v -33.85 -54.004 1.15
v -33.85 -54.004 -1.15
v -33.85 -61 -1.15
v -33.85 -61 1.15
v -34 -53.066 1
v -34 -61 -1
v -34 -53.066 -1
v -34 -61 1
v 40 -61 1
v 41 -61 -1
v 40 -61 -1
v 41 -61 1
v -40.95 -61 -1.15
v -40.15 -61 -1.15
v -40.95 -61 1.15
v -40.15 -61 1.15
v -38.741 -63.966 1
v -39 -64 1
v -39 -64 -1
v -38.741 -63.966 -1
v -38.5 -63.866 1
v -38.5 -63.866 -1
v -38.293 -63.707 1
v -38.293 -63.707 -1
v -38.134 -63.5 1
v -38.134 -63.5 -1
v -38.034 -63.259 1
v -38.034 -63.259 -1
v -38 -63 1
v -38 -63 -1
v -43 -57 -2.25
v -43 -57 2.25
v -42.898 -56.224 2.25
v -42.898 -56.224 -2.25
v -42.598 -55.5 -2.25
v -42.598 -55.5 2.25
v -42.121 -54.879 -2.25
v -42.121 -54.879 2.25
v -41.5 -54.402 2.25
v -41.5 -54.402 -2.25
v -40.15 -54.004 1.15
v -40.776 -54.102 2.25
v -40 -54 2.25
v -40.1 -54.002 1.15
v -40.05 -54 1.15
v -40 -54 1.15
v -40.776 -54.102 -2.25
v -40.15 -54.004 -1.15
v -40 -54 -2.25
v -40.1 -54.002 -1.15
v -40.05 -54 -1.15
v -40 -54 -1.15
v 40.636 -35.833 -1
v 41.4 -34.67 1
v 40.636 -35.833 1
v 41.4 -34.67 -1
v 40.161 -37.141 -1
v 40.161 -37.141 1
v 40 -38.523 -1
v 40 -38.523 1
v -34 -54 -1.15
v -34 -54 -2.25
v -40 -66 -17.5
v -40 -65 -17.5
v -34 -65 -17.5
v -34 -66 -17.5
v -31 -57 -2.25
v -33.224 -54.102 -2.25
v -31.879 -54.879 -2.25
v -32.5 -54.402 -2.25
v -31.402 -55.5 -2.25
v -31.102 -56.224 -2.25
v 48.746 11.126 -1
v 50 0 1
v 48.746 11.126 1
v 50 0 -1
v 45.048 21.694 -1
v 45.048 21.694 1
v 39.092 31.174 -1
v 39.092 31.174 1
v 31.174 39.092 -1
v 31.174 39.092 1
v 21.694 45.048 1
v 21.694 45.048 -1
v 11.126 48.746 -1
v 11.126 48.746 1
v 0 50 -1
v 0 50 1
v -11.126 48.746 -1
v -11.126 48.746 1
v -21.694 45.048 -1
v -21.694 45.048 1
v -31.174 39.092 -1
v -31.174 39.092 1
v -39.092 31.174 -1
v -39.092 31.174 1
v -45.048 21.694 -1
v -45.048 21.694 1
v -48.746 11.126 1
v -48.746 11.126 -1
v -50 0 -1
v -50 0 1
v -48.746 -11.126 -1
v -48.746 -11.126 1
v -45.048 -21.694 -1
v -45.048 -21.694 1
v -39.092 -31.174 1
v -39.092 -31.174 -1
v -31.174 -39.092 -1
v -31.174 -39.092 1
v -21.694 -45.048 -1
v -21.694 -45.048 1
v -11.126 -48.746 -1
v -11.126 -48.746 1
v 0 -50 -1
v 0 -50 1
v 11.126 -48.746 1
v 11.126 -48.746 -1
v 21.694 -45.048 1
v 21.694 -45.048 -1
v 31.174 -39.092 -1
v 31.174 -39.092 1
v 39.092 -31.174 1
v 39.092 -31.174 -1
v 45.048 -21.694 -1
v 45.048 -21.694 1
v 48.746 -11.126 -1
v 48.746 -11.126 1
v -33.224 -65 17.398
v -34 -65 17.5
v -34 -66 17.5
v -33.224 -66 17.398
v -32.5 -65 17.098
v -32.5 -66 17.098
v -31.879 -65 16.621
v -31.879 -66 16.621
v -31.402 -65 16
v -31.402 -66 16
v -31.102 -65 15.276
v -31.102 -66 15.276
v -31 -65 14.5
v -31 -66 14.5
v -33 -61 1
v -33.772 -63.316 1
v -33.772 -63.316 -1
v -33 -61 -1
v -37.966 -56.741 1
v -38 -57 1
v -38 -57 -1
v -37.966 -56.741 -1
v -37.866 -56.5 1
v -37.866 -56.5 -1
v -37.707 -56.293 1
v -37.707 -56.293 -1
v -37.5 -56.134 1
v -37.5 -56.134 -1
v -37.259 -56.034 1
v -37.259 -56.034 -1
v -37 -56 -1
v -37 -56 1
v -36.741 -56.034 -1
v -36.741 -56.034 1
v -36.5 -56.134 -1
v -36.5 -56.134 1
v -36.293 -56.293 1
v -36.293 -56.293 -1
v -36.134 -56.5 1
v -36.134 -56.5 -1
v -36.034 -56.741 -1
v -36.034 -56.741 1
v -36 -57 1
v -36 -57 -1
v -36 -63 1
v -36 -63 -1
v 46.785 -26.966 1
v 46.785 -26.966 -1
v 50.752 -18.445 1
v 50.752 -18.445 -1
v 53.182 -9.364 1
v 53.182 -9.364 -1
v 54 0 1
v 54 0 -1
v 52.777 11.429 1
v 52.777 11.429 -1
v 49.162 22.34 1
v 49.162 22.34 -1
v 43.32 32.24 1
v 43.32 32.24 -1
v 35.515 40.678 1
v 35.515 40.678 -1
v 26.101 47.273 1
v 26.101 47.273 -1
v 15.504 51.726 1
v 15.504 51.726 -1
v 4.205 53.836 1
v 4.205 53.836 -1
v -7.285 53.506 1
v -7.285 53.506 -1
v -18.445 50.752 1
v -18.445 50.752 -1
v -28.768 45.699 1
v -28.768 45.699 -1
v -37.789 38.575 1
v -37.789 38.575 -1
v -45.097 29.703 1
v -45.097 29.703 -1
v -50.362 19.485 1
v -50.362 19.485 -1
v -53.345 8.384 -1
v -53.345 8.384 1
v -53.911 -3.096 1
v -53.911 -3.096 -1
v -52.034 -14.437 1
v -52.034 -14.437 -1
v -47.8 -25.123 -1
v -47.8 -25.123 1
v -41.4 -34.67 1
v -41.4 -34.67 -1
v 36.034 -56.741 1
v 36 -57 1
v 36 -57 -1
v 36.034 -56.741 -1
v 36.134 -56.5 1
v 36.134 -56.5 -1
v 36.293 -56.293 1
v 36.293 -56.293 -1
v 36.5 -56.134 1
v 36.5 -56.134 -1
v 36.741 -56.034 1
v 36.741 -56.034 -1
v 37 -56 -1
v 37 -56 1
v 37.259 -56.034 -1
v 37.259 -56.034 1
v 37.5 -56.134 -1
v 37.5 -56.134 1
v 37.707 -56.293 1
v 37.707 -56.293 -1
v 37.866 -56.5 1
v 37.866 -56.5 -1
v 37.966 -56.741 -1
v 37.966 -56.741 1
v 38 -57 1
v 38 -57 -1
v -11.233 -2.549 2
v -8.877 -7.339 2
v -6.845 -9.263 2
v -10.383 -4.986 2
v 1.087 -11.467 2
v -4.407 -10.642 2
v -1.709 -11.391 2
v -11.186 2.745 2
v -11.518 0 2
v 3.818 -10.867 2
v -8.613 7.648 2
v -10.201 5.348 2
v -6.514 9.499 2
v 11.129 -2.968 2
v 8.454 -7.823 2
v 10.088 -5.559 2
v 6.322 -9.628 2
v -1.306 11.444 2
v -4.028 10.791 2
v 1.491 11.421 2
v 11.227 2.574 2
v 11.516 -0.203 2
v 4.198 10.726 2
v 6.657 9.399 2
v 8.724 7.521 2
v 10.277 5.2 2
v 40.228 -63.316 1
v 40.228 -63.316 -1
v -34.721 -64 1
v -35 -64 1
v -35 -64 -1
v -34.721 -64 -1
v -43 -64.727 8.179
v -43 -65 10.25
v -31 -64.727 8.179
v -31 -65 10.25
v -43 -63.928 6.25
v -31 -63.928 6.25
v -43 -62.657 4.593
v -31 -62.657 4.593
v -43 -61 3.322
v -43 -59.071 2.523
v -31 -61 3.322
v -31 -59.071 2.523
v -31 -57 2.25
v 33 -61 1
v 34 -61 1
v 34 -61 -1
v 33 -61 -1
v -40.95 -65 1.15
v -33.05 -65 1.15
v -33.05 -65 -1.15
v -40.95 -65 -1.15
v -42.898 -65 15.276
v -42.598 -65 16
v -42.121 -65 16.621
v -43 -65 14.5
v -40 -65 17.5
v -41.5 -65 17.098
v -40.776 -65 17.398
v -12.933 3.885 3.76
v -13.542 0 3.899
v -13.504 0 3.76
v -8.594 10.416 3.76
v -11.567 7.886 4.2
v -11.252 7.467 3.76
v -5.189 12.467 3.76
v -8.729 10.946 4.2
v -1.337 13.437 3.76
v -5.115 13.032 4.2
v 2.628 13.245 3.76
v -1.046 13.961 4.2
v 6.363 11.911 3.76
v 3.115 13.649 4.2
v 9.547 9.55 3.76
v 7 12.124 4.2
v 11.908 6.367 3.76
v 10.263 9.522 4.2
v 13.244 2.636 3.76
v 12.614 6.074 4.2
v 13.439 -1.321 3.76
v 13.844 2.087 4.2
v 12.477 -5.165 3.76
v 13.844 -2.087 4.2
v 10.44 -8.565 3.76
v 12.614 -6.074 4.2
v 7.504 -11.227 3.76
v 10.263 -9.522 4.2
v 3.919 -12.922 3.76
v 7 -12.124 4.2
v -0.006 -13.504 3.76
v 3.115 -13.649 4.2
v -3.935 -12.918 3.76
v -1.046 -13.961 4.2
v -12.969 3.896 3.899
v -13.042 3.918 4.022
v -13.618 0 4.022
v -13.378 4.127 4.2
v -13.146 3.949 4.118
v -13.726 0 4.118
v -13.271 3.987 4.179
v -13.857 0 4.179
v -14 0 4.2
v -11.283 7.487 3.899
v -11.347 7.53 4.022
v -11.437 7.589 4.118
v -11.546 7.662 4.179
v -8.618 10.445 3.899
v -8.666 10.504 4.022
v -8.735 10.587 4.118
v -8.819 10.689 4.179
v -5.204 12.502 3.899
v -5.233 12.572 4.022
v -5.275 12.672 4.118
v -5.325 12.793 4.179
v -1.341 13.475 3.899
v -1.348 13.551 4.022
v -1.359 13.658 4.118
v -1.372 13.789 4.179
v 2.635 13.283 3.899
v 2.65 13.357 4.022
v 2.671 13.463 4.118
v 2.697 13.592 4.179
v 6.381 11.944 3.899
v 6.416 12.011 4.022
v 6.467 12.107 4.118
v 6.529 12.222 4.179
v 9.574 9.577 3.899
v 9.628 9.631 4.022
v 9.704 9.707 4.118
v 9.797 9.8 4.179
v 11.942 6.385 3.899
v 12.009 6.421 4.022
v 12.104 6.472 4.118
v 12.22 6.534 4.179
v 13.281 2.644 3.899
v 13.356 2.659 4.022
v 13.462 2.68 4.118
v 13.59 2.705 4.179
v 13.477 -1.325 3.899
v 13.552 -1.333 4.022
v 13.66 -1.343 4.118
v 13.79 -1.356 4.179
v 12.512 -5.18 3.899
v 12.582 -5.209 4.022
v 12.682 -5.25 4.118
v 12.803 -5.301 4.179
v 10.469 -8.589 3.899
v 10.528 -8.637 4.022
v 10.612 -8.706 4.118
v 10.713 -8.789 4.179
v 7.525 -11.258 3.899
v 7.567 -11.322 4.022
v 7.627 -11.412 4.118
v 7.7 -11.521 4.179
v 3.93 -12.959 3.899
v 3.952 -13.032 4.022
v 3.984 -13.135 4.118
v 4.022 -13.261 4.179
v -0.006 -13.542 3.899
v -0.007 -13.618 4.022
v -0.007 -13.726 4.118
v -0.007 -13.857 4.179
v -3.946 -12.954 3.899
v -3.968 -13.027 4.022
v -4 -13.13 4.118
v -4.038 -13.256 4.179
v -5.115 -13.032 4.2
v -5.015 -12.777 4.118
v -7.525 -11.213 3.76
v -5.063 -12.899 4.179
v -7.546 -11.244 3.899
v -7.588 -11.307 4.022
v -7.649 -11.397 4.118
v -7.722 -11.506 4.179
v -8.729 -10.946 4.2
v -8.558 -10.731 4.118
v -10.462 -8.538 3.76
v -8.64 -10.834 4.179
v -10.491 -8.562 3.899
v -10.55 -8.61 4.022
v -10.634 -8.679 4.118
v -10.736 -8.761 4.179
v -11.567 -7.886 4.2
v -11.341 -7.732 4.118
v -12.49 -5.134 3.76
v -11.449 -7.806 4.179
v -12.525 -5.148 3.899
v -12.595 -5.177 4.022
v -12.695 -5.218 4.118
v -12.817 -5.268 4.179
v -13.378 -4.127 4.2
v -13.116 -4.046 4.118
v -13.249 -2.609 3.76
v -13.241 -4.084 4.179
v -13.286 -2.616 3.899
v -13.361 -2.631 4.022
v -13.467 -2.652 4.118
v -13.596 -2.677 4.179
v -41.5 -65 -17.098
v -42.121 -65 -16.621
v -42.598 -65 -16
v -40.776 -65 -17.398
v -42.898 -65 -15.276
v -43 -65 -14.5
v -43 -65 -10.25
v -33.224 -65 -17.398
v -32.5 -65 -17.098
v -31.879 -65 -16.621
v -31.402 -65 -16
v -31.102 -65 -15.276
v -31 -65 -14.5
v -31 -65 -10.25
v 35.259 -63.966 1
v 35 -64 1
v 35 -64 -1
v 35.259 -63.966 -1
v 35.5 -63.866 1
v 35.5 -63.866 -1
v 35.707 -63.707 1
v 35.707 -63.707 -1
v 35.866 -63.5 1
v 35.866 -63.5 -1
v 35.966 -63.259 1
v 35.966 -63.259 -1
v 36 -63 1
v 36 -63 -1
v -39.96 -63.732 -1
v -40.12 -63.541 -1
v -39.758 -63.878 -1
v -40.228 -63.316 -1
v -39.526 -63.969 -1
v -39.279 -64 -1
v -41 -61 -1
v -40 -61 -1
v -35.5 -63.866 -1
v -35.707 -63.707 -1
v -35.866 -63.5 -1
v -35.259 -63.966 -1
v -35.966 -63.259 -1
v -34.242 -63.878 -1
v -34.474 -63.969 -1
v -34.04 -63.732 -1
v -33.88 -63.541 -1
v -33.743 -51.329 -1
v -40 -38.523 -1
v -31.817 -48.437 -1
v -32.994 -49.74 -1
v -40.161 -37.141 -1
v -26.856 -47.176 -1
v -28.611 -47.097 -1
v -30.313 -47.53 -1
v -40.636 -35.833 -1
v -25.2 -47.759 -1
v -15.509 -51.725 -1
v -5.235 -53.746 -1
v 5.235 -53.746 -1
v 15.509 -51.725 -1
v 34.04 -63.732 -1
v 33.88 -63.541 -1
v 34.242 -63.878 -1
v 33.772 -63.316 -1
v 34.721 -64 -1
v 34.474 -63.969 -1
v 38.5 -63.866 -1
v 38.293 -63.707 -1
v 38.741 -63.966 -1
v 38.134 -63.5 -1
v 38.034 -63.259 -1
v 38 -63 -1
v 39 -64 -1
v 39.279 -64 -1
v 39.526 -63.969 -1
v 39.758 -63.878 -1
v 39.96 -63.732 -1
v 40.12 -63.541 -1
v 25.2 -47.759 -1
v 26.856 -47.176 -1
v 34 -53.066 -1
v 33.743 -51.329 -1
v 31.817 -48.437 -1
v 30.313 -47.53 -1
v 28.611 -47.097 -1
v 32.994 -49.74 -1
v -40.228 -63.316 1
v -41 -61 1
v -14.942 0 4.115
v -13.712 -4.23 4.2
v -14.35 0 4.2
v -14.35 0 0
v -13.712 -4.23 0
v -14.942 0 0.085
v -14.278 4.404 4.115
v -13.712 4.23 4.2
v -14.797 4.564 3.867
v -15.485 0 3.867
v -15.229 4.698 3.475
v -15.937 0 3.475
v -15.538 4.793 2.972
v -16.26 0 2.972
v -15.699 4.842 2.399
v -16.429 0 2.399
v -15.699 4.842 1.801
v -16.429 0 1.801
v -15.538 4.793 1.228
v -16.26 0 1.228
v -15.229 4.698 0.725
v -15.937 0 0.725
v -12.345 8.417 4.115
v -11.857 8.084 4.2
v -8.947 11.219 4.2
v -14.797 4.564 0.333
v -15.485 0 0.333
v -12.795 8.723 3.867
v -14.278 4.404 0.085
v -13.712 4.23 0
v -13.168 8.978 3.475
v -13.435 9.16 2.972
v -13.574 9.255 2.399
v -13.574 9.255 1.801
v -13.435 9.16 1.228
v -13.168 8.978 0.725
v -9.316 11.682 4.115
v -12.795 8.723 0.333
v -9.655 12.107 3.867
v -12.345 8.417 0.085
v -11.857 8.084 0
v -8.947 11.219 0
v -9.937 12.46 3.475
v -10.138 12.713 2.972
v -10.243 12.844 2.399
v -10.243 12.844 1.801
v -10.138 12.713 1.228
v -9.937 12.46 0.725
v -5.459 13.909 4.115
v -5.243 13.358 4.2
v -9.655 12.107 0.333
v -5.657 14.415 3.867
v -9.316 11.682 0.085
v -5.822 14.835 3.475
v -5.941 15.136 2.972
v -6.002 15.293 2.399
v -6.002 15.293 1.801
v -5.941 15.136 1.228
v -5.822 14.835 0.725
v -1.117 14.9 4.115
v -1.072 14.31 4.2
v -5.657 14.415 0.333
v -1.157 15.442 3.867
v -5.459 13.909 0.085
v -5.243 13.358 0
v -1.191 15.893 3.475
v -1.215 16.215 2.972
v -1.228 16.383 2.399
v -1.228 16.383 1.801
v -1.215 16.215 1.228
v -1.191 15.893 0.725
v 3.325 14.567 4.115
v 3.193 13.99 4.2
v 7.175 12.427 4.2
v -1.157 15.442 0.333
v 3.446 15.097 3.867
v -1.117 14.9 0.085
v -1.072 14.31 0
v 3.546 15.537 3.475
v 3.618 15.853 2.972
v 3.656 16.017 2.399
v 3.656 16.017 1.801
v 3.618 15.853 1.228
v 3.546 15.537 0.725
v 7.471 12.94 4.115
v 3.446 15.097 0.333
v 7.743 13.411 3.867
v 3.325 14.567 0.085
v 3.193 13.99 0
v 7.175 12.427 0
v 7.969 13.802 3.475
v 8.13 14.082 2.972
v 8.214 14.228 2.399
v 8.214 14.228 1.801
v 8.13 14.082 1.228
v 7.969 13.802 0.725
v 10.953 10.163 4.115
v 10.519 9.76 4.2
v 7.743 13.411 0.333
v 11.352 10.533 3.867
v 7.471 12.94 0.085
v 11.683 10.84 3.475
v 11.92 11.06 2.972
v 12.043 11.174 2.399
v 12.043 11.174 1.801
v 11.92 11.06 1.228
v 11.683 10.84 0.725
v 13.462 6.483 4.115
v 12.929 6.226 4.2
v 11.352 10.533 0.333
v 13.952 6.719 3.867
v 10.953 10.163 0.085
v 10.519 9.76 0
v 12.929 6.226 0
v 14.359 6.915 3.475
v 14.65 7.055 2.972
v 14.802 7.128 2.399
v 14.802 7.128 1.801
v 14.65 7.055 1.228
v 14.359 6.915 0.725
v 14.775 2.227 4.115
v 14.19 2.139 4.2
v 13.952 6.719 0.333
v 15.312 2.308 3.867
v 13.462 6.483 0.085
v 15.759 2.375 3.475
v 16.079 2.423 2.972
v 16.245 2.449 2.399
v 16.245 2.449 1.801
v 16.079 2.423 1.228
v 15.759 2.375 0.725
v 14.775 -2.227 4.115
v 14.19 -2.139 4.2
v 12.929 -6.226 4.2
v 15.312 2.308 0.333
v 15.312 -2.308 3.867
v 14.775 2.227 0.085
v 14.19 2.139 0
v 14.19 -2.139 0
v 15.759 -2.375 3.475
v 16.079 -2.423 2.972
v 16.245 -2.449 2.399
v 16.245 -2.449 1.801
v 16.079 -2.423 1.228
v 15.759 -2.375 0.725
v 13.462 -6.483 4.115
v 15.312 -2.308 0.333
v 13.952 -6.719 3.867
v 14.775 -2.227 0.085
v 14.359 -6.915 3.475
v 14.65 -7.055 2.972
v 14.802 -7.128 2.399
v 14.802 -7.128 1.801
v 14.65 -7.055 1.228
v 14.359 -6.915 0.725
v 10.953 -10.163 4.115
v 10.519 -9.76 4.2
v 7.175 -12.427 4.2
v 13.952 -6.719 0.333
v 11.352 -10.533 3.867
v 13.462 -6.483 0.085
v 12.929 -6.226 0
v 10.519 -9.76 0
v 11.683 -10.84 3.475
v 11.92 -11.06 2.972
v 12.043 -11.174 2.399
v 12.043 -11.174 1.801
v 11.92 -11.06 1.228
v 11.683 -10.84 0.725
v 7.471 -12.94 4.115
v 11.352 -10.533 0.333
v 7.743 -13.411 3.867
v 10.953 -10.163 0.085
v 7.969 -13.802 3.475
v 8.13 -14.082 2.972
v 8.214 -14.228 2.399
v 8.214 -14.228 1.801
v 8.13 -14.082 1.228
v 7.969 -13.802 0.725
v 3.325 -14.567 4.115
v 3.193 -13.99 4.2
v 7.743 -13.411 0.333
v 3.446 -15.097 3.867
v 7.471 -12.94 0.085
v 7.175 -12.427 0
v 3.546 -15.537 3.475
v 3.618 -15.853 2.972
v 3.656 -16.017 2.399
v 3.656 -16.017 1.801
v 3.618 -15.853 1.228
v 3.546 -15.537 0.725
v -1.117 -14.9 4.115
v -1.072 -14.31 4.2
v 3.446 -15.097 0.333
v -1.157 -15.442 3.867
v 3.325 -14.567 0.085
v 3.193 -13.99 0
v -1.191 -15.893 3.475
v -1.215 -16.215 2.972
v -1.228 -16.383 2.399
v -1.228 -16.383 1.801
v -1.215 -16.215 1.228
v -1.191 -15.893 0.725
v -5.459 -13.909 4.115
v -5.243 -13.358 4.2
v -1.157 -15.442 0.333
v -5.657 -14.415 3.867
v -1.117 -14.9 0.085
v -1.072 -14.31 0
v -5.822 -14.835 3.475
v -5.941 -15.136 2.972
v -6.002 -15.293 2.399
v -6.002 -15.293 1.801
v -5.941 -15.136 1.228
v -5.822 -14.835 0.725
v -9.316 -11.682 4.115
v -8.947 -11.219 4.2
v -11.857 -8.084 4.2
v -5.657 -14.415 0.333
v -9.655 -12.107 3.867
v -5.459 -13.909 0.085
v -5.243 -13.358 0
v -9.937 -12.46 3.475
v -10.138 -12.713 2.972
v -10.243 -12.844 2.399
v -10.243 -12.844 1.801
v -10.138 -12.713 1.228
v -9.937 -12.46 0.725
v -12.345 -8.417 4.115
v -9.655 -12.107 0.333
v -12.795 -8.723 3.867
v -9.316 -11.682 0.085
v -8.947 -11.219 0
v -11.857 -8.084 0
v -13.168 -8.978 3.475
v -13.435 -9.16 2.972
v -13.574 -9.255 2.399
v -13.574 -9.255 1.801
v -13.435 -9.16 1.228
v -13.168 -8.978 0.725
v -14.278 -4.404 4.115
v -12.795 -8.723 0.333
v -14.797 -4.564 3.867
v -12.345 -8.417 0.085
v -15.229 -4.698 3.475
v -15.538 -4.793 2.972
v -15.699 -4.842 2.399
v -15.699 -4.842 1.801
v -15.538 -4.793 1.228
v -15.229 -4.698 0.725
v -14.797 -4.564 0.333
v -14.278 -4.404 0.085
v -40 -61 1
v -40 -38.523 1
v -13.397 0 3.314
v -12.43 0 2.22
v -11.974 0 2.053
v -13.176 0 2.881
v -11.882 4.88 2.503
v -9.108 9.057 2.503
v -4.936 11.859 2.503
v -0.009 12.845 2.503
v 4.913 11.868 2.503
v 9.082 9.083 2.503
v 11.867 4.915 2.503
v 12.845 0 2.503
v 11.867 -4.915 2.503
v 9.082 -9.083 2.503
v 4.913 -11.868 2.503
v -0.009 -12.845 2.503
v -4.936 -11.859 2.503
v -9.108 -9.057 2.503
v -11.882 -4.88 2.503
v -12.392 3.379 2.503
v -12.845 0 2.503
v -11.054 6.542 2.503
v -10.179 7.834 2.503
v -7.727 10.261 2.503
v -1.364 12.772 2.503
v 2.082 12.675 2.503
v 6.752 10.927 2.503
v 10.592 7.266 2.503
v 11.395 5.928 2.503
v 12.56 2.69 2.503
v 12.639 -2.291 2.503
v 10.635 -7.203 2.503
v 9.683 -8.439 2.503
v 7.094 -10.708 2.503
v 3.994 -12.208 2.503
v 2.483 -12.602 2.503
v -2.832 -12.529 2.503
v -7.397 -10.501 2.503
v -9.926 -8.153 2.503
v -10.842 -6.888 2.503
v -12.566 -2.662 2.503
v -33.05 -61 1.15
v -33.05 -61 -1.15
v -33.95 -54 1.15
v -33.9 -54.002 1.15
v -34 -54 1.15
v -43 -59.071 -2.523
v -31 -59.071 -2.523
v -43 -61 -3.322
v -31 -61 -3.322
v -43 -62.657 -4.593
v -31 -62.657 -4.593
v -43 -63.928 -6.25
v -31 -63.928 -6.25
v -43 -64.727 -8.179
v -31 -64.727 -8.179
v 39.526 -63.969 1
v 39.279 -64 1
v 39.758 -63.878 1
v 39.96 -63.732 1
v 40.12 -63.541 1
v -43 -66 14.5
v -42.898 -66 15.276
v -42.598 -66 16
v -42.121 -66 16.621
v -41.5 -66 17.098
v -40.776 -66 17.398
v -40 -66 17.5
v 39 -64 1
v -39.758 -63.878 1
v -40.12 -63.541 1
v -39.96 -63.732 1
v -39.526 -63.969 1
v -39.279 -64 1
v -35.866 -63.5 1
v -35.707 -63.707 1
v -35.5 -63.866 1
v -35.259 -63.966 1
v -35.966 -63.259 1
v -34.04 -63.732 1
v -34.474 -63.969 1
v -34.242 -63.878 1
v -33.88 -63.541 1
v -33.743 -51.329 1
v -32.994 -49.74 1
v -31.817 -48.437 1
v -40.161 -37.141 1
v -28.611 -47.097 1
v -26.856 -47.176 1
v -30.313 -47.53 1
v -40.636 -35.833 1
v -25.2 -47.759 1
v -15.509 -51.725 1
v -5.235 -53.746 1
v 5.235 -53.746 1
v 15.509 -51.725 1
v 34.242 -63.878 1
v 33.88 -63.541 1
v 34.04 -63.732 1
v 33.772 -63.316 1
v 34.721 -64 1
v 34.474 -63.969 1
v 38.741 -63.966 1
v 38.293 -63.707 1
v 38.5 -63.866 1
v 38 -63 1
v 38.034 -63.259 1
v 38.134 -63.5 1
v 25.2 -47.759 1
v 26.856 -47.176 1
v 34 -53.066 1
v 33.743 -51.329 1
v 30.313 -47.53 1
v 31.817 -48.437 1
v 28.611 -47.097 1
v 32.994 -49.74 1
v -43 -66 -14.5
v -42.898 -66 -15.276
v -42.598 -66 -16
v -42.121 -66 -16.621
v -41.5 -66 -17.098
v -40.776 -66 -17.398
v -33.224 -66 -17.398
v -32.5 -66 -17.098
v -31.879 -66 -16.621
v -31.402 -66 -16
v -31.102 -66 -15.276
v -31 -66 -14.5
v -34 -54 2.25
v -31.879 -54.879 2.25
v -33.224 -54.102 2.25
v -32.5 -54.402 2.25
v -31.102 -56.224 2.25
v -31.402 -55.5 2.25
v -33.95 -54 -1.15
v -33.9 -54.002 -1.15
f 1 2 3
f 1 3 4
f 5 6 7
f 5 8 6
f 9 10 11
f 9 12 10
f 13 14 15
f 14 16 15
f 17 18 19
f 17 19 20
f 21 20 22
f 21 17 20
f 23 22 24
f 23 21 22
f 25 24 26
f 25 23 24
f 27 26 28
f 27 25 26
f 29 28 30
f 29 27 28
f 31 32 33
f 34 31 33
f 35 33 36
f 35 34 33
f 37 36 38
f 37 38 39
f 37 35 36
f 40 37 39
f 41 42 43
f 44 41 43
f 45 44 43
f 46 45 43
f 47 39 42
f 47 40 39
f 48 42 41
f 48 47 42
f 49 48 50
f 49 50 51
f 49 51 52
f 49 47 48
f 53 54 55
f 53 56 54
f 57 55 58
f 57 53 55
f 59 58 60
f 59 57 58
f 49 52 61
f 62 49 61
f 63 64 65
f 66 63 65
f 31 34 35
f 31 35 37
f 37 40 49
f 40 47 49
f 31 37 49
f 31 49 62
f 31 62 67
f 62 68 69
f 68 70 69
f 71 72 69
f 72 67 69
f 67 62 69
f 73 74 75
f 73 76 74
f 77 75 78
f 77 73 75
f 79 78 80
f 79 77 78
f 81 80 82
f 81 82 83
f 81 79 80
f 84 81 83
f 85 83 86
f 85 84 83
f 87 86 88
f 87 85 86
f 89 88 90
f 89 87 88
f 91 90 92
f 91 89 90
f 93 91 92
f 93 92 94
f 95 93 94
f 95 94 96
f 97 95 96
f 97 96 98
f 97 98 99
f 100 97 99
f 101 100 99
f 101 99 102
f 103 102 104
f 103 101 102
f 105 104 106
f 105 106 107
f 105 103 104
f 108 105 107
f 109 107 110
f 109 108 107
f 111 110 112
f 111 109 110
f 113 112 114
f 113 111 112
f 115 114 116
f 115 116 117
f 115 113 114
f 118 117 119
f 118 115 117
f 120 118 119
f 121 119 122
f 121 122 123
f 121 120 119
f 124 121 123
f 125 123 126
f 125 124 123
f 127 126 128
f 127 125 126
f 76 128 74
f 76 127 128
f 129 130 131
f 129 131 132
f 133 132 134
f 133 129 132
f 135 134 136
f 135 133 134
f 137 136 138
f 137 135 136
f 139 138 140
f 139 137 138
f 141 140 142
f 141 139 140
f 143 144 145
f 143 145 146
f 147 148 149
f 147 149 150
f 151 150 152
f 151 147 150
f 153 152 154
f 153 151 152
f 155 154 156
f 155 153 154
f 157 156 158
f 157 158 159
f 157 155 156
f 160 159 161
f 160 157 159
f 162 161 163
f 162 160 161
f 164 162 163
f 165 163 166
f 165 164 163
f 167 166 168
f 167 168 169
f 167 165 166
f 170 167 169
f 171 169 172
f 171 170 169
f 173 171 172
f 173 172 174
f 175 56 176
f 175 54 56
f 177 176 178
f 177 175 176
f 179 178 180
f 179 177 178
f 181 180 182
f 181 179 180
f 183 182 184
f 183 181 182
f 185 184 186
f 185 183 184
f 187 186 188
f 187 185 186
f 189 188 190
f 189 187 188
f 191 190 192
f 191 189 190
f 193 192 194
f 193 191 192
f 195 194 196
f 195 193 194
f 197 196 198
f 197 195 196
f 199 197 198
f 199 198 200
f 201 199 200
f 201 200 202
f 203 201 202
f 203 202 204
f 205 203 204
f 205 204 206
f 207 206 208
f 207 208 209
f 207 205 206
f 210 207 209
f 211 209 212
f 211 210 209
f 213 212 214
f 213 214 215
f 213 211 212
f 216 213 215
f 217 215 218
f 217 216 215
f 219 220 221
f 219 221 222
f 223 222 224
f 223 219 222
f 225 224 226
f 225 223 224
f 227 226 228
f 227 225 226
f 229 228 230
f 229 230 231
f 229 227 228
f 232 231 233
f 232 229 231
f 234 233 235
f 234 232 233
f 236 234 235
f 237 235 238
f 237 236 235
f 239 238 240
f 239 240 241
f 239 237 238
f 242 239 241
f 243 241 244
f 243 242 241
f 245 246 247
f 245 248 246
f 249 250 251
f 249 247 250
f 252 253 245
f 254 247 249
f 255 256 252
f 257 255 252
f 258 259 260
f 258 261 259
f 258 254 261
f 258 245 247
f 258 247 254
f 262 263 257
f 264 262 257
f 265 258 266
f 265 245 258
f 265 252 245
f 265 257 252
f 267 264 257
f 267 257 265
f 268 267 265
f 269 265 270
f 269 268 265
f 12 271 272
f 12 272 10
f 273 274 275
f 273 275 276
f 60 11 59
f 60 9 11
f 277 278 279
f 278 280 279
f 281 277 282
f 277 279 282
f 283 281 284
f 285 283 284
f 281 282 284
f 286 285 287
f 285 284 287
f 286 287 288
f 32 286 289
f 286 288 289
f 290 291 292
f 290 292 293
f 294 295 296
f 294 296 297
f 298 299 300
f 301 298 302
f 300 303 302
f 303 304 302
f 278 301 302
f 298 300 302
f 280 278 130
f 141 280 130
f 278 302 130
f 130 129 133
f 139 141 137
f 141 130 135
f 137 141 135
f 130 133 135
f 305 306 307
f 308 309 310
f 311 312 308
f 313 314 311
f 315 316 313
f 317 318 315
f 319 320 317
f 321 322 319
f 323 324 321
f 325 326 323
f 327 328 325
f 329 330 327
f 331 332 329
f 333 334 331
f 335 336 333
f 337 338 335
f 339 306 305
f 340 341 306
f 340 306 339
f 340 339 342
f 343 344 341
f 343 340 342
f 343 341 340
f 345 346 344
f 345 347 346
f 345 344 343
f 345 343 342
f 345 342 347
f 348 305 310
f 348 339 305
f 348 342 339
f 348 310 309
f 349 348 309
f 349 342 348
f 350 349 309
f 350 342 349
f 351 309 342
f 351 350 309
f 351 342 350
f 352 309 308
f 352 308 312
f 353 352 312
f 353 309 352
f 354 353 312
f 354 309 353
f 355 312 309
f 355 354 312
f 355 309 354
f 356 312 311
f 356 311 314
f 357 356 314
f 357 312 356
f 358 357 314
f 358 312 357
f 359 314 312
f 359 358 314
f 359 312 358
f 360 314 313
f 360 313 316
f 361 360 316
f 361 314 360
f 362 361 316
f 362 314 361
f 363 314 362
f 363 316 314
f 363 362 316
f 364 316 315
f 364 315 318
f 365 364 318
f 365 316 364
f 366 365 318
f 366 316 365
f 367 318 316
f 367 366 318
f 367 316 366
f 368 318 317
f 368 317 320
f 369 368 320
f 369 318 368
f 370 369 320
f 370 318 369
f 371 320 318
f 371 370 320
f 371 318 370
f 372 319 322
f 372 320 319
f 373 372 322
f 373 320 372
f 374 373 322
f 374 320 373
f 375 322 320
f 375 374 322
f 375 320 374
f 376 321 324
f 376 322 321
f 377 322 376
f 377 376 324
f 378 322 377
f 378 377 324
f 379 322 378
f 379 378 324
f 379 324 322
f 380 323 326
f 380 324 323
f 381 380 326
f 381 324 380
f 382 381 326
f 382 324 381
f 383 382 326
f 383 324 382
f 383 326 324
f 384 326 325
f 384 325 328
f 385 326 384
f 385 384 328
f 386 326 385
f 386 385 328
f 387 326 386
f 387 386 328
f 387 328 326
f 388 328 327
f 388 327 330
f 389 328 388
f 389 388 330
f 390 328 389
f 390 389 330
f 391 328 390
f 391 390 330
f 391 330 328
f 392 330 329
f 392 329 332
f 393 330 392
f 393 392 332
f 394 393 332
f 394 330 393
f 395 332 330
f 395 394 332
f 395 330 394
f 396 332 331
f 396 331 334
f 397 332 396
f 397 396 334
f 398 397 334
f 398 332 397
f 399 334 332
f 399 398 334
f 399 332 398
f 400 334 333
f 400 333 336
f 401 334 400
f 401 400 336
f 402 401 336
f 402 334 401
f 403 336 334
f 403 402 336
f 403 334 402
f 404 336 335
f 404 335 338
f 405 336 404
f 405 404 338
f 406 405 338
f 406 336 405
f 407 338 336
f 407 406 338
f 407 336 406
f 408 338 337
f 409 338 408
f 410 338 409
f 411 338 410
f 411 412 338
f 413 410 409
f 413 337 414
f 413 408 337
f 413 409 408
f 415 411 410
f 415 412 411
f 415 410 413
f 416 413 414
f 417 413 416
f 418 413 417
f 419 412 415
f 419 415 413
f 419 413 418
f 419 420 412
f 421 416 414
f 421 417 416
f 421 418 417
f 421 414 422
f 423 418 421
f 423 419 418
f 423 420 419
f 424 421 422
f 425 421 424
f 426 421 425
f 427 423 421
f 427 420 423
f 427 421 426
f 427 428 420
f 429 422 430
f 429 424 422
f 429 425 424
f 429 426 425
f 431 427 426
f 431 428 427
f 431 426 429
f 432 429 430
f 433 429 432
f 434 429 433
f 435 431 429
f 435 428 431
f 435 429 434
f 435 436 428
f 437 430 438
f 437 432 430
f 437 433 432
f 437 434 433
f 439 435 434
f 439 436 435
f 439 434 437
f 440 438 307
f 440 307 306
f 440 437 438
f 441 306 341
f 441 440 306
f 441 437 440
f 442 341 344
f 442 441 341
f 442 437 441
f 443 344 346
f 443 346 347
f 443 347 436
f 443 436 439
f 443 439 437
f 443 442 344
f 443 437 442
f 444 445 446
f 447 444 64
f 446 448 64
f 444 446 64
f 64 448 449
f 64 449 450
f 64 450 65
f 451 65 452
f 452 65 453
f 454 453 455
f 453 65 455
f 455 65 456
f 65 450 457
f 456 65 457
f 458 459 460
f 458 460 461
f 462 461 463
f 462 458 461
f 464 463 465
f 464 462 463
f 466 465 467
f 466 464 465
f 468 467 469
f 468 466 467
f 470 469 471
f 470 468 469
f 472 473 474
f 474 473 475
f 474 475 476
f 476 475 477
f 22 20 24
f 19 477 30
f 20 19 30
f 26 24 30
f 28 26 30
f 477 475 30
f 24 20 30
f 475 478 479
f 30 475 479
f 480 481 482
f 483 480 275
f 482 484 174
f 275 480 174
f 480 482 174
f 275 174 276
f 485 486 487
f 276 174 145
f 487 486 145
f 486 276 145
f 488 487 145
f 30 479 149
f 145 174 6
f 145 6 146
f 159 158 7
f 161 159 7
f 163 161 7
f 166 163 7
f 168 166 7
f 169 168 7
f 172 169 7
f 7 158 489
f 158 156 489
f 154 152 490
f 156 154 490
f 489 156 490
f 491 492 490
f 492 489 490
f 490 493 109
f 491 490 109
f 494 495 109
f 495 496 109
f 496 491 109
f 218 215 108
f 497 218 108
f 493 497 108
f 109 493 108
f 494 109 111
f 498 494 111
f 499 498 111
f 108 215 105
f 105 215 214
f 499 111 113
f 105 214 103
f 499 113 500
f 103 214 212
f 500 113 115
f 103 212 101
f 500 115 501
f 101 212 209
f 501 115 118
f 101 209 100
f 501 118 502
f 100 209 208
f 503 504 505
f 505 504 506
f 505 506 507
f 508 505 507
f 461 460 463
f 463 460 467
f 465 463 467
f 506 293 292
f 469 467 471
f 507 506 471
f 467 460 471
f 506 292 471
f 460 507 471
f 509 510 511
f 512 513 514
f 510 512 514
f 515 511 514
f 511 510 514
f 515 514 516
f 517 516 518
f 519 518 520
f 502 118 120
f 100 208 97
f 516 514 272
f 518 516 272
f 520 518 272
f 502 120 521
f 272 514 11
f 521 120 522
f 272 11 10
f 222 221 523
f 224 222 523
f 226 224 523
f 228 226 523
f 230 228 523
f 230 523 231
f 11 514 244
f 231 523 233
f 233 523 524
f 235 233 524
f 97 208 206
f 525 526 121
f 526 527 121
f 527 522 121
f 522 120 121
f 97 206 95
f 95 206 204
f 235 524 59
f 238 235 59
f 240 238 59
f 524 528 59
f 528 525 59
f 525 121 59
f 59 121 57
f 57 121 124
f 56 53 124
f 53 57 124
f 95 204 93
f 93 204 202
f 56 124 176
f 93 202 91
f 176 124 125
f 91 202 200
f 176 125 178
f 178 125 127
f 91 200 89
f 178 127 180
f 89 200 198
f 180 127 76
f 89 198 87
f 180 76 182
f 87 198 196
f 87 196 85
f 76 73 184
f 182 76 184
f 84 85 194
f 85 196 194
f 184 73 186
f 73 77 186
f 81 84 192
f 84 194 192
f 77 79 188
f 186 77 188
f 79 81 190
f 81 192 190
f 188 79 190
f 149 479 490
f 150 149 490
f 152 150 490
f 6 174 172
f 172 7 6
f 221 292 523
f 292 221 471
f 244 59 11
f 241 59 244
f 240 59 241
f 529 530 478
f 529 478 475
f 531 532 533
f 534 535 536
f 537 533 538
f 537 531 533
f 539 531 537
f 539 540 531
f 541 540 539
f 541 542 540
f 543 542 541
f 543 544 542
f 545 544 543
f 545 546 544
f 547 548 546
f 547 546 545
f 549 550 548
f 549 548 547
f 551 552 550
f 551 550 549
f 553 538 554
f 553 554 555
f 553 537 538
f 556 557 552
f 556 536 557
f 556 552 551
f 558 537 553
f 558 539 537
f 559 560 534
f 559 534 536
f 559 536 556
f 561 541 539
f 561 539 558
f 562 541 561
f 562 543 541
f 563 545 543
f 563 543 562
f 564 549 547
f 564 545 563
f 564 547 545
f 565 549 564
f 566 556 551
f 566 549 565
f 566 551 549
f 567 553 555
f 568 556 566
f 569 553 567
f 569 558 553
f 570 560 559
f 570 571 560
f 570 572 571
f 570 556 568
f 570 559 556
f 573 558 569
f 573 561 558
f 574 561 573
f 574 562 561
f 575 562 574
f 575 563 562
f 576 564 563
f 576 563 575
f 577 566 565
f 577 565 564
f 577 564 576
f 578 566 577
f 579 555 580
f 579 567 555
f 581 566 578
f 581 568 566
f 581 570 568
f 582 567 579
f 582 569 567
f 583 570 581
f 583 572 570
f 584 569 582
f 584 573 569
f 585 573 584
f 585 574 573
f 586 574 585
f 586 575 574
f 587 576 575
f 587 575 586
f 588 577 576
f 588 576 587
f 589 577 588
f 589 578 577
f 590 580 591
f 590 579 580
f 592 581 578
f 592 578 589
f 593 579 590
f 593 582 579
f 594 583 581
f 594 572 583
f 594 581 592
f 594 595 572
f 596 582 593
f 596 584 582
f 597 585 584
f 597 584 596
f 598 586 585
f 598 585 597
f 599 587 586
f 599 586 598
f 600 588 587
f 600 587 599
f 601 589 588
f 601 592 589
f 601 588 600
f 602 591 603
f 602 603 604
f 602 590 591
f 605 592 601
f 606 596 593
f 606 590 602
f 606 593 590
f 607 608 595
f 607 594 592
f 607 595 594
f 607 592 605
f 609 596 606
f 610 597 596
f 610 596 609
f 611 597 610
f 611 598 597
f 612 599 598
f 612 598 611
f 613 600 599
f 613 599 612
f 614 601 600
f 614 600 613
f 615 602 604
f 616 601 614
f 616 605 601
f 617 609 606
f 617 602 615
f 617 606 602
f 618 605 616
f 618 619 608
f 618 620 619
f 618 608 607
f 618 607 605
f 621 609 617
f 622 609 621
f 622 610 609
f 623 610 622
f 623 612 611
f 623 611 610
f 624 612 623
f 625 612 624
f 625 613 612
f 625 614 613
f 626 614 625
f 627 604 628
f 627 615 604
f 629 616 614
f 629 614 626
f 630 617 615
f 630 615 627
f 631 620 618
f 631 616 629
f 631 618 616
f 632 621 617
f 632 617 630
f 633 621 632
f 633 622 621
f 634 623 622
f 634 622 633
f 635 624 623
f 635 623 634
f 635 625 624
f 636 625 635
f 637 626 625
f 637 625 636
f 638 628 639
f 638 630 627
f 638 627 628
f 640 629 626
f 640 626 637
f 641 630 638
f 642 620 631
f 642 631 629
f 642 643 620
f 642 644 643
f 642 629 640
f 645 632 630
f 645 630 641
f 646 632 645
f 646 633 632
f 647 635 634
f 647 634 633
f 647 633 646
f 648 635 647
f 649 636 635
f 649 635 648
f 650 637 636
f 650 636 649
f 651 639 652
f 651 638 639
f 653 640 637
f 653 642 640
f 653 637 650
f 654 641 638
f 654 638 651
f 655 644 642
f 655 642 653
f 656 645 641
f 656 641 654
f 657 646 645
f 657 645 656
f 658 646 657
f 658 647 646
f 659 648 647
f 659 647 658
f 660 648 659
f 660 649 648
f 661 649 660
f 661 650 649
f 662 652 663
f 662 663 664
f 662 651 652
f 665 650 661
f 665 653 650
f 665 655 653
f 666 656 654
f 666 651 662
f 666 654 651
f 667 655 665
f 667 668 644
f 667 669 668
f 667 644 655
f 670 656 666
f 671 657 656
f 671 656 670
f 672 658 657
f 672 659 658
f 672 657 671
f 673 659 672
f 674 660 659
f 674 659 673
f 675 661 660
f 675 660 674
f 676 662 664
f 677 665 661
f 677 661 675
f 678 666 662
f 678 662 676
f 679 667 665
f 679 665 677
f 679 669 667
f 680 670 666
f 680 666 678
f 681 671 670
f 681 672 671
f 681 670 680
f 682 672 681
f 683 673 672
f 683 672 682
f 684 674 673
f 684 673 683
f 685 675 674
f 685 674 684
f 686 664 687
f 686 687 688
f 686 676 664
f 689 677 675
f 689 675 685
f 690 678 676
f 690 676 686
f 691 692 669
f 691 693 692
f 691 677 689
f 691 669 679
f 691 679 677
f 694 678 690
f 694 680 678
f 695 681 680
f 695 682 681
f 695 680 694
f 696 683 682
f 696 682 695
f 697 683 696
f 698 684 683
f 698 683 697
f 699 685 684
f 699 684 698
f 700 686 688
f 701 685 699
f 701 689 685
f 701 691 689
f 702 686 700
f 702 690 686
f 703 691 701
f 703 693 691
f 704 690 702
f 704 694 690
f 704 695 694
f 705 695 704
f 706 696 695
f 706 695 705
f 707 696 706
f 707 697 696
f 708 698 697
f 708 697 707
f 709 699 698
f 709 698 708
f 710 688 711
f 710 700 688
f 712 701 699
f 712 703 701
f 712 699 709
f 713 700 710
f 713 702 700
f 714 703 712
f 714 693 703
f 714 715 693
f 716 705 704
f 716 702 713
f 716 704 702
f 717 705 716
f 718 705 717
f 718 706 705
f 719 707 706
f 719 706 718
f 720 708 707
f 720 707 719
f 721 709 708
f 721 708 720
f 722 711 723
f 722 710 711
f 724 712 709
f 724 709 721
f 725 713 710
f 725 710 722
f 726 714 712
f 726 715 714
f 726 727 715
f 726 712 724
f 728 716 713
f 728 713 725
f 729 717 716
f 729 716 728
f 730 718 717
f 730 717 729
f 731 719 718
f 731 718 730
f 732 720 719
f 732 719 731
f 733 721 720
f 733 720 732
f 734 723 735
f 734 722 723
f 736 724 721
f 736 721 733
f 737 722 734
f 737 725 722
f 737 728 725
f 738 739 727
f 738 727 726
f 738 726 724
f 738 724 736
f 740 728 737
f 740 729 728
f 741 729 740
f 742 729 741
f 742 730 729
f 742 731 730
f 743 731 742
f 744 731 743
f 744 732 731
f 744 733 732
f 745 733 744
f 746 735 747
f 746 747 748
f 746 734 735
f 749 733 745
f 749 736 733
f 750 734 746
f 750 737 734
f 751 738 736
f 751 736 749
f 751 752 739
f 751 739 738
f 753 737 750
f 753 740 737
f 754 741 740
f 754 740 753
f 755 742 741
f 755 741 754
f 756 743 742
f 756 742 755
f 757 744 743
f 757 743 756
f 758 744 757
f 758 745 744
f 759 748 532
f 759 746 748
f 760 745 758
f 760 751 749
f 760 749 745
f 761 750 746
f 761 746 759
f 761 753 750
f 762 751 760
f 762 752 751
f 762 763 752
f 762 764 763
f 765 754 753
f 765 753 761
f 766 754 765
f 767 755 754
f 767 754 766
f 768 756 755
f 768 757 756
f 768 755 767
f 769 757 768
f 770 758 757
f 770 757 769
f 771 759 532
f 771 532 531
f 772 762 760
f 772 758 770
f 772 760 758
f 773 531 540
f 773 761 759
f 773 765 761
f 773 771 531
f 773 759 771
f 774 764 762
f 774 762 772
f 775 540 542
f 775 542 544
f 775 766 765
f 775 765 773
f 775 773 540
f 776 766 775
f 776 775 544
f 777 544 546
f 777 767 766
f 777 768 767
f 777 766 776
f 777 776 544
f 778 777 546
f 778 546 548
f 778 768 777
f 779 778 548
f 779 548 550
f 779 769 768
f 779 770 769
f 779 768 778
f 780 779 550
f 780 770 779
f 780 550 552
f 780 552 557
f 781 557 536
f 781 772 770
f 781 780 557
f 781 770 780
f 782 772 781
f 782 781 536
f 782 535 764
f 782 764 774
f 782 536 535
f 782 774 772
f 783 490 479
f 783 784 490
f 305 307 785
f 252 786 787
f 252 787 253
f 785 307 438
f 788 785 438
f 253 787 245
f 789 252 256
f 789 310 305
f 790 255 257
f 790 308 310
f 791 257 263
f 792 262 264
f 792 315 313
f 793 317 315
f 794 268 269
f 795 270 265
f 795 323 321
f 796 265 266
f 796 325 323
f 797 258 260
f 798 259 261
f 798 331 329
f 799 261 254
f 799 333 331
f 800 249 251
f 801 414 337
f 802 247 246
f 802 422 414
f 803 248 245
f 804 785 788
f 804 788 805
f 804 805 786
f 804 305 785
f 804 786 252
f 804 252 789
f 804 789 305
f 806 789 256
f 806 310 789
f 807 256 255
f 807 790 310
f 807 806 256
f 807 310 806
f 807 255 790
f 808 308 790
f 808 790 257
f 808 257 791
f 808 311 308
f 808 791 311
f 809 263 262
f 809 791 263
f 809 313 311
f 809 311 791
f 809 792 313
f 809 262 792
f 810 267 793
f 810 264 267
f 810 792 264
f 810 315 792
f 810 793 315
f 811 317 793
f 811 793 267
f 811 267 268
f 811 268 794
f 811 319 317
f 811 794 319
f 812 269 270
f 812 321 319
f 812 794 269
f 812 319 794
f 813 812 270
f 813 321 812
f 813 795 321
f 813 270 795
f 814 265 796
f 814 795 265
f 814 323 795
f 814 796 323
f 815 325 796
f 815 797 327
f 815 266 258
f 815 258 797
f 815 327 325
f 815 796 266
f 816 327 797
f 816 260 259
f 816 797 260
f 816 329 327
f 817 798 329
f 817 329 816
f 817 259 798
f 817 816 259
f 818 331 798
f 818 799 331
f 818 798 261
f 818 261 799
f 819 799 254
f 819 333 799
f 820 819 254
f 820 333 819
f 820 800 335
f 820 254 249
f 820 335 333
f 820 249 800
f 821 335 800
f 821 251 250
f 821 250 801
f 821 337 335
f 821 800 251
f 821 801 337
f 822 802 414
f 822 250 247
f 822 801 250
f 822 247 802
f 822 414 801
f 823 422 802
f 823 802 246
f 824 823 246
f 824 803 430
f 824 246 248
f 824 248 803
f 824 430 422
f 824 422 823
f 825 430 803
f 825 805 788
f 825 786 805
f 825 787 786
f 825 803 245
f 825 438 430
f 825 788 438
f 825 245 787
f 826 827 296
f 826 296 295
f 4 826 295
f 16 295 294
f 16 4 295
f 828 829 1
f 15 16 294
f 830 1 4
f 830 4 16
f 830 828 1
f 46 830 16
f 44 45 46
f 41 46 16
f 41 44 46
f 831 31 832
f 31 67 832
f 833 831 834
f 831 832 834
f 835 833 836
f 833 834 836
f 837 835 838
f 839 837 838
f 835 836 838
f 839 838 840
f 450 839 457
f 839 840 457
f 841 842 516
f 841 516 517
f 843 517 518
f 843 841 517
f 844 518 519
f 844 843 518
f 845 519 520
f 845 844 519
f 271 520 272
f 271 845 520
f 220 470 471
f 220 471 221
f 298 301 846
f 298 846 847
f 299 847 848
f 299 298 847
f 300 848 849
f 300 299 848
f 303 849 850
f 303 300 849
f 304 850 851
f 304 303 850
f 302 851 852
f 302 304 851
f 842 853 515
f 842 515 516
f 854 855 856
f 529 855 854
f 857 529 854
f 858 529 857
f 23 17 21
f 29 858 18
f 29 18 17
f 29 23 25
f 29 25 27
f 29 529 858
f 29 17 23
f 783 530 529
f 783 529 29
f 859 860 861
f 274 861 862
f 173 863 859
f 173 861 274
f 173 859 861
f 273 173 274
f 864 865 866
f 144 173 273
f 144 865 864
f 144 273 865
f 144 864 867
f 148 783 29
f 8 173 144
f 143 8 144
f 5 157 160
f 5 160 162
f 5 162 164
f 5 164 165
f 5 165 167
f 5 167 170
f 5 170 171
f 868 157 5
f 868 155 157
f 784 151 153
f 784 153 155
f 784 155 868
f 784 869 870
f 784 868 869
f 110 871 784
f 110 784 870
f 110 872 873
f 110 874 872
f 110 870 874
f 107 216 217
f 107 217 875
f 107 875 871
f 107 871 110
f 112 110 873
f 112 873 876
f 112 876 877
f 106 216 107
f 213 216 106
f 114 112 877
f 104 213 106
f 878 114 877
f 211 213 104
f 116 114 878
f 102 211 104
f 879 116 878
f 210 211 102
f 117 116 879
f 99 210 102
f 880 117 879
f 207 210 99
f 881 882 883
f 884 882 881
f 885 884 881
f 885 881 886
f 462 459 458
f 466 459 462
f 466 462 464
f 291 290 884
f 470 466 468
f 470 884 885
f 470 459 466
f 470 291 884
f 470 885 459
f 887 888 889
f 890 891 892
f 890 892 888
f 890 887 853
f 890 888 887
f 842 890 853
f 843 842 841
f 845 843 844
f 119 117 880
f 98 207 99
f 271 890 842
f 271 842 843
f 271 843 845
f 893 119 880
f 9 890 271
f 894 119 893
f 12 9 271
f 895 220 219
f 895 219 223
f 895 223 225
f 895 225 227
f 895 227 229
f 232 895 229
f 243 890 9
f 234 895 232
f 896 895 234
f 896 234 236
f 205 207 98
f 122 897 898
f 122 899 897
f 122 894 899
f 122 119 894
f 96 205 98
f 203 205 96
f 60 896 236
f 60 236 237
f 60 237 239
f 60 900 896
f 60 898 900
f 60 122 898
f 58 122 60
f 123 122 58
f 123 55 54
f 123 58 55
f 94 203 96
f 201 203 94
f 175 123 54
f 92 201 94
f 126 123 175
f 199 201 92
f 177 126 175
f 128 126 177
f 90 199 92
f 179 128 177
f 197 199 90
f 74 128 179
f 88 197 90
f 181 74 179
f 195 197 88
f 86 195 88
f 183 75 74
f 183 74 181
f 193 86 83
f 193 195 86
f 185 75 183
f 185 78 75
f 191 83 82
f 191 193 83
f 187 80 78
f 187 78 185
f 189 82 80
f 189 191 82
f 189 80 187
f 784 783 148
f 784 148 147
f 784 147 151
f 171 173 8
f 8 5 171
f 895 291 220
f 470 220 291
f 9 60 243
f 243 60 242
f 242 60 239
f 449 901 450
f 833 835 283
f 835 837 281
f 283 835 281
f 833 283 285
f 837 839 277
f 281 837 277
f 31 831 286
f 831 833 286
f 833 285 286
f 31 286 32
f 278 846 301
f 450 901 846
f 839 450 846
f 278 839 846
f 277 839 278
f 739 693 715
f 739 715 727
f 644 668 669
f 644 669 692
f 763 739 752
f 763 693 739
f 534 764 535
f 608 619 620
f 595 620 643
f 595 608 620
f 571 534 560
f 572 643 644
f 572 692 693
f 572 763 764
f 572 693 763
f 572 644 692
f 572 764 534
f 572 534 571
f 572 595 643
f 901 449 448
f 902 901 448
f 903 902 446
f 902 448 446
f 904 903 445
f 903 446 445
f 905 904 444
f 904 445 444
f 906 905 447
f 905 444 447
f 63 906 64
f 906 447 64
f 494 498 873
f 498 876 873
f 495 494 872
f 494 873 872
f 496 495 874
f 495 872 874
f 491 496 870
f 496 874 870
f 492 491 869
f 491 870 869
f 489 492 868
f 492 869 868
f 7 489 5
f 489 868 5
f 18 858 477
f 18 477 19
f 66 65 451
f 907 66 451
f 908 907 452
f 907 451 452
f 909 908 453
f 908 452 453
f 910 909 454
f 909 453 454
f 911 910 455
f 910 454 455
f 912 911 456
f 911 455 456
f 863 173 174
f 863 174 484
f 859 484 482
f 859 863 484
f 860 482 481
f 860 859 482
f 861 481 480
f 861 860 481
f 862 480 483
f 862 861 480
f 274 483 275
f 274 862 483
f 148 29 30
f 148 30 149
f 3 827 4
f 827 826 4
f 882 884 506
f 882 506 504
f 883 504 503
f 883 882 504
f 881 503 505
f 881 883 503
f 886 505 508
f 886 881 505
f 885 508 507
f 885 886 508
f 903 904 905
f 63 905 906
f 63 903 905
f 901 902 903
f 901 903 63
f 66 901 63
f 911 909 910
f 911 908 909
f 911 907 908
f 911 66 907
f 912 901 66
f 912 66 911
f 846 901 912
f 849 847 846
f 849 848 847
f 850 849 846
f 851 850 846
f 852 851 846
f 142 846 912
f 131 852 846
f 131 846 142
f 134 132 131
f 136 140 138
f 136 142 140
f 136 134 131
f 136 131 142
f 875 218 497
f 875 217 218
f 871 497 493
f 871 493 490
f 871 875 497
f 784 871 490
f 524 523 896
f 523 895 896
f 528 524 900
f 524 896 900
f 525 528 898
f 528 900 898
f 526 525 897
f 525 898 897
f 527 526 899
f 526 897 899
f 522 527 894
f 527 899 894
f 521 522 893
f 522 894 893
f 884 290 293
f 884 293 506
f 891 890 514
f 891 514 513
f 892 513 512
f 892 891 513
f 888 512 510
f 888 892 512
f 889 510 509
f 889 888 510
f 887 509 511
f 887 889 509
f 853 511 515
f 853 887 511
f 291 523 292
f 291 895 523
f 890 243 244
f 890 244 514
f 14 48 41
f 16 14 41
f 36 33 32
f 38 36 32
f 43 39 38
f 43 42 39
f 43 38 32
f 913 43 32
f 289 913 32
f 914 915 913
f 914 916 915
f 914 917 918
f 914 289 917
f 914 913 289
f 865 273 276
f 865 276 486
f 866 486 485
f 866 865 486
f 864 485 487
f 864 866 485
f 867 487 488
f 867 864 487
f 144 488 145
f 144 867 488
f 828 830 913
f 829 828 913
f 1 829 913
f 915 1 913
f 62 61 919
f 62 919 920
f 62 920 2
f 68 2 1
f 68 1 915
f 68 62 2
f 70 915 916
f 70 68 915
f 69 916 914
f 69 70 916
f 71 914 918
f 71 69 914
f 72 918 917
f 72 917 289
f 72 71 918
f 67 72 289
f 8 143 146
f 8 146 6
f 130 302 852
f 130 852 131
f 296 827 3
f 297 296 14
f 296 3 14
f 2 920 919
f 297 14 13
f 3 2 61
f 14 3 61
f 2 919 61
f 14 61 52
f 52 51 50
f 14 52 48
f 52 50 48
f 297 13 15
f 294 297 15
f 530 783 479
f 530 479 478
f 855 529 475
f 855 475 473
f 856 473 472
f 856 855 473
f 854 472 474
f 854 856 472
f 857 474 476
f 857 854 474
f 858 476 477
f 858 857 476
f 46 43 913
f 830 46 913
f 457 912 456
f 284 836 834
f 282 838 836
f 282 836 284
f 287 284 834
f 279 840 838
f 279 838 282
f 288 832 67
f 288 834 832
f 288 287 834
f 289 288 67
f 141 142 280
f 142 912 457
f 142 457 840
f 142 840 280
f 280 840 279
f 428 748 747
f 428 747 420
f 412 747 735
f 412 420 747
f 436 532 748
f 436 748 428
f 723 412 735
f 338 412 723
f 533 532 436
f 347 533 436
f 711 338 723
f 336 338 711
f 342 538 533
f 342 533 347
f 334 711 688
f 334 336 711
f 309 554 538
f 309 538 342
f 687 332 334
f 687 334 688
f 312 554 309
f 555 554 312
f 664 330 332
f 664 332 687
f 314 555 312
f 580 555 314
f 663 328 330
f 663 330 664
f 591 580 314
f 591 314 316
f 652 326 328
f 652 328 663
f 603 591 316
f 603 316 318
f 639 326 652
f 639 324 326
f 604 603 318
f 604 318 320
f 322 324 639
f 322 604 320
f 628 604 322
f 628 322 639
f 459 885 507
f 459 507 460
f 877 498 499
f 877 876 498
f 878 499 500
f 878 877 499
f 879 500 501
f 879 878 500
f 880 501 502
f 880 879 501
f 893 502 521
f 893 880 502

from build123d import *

# Parameters (mm, degrees)
F2_R         = 0.5
F3_R         = 2
F4_R         = 50
F5_DEPTH     = 1
F6_R         = 6
F7_W         = 12
F7_H         = 12
F8_DEPTH     = 2.25
F9_W         = 6.3
F9_H         = 2.3
F9_W_2       = 6
F9_H_2       = 2
F10_DEPTH    = 7
F11_START    = -7
F9_W_3       = 0.8
F11_DEPTH    = 4
F12_W        = 12
F12_H        = 1
F13_DEPTH    = 17.5
F14_R        = 8
F15_T1_DEPTH = 19.5
F15_T3_DEPTH = 16


# Not quite as in the source:
# - a fillet or chamfer that OpenCascade refuses, or shapes differently, is made with other operations: its cross-section is extruded or revolved along the edge and cut away or added


with BuildPart() as f1:
    # F0 (on Front) → F1 (revolve)
    with BuildSketch(Plane.XZ):
        with BuildLine():
            Line((-14.35, 0), (0, 0))
            Line((0, 0), (0, 2))
            Line((0, 2), (-13.5, 2))
            Line((-13.5, 2), (-13.5, 4.2))
            Line((-13.5, 4.2), (-14.35, 4.2))
            ThreePointArc((-14.35, 4.2), (-16.45, 2.1), (-14.35, 0))
        make_face()
    revolve(axis=Axis((0, 0, 1), (0, 0, -1)))

    # F2
    f2_edges = [f1.edges().sort_by_distance(p)[0] for p in [
        (13.5, 0, 4.2),
    ]]
    fillet(f2_edges, radius=F2_R)

    # F3
    f3_edges = [f1.edges().sort_by_distance(p)[0] for p in [
        (13.5, 0, 2),
    ]]
    fillet(f3_edges, radius=F3_R)


with BuildPart() as f5:
    # F4 (on Top) → F5 (new body, symmetric)
    with BuildSketch(Plane.XY):
        with BuildLine():
            ThreePointArc((40, -36.2767142944), (50.3785668712, -19.4422220952), (54, 0))
            ThreePointArc((54, 0), (-19.4422220952, 50.3785668712), (-40, -36.2767142944))
            ThreePointArc((-40, -36.2767142944), (-37.1086677383, -39.2294121635), (-34, -41.9523539268))
            ThreePointArc((-34, -41.9523539268), (0, -54), (34, -41.9523539268))
            ThreePointArc((34, -41.9523539268), (37.1086677383, -39.2294121635), (40, -36.2767142944))
        make_face()
        Circle(F4_R, mode=Mode.SUBTRACT)
        with BuildLine():
            ThreePointArc((-34, -41.9523539268), (-37.1086677383, -39.2294121635), (-40, -36.2767142944))
            Line((-40, -36.2767142944), (-40, -61))
            Line((-40, -61), (-41, -61))
            Line((-41, -61), (-40.227924078, -63.316227766))
            ThreePointArc((-40.227924078, -63.316227766), (-39.8639510646, -63.8112421852), (-39.2792407799, -64))
            Line((-39.2792407799, -64), (-39, -64))
            ThreePointArc((-39, -64), (-38.2928932188, -63.7071067812), (-38, -63))
            Line((-38, -63), (-38, -57))
            ThreePointArc((-38, -57), (-37.7071067812, -56.2928932188), (-37, -56))
            ThreePointArc((-37, -56), (-36.2928932188, -56.2928932188), (-36, -57))
            Line((-36, -57), (-36, -63))
            ThreePointArc((-36, -63), (-35.7071067812, -63.7071067812), (-35, -64))
            Line((-35, -64), (-34.7207592201, -64))
            ThreePointArc((-34.7207592201, -64), (-34.1360489354, -63.8112421852), (-33.772075922, -63.316227766))
            Line((-33.772075922, -63.316227766), (-33, -61))
            Line((-33, -61), (-34, -61))
            Line((-34, -61), (-34, -41.9523539268))
        make_face()
        with BuildLine():
            Line((40, -61), (40, -36.2767142944))
            ThreePointArc((40, -36.2767142944), (37.1086677383, -39.2294121635), (34, -41.9523539268))
            Line((34, -41.9523539268), (34, -61))
            Line((34, -61), (33, -61))
            Line((33, -61), (33.772075922, -63.316227766))
            ThreePointArc((33.772075922, -63.316227766), (34.1360489354, -63.8112421852), (34.7207592201, -64))
            Line((34.7207592201, -64), (35, -64))
            ThreePointArc((35, -64), (35.7071067812, -63.7071067812), (36, -63))
            Line((36, -63), (36, -57))
            ThreePointArc((36, -57), (36.2928932188, -56.2928932188), (37, -56))
            ThreePointArc((37, -56), (37.7071067812, -56.2928932188), (38, -57))
            Line((38, -57), (38, -63))
            ThreePointArc((38, -63), (38.2928932188, -63.7071067812), (39, -64))
            Line((39, -64), (39.2792407799, -64))
            ThreePointArc((39.2792407799, -64), (39.8639510646, -63.8112421852), (40.227924078, -63.316227766))
            Line((40.227924078, -63.316227766), (41, -61))
            Line((41, -61), (40, -61))
        make_face()
    extrude(amount=F5_DEPTH, both=True)

    # F6
    f6_edges = [f5.edges().sort_by_distance(p)[0] for p in [
        (-34, -41.952354, 0),
        (-40, -36.276714, 0),
        (40, -36.276714, 0),
        (34, -41.952354, 0),
    ]]
    fillet(f6_edges, radius=F6_R)


with BuildPart() as f8:
    # F7 (on Top) → F8 (new body, symmetric)
    with BuildSketch(Plane.XY):
        with Locations((-37, -60)):
            Rectangle(F7_W, F7_H)
    extrude(amount=F8_DEPTH, both=True)

    # F9 (on face) → F10 (cut)
    with BuildSketch(Plane(origin=(0, -54, 0), x_dir=(-1, 0, 0), z_dir=(0, 1, 0))):
        with Locations((37, 0)):
            Rectangle(F9_W, F9_H)
        with Locations((37, 0)):
            Rectangle(F9_W_2, F9_H_2, mode=Mode.SUBTRACT)
        with Locations((37, 0)):
            Rectangle(F9_W_2, F9_H_2)
    extrude(amount=-F10_DEPTH, mode=Mode.SUBTRACT)

    # F9 (on face) → F11 (cut)
    with BuildSketch(Plane(origin=(0, -54, 0), x_dir=(-1, 0, 0), z_dir=(0, 1, 0)).offset(F11_START)):
        with Locations((40.55, 0)):
            Rectangle(F9_W_3, F9_H)
        with Locations((37, 0)):
            Rectangle(F9_W, F9_H)
        with Locations((37, 0)):
            Rectangle(F9_W_2, F9_H_2, mode=Mode.SUBTRACT)
        with Locations((37, 0)):
            Rectangle(F9_W_2, F9_H_2)
        with Locations((33.45, 0)):
            Rectangle(F9_W_3, F9_H)
    extrude(amount=-F11_DEPTH, mode=Mode.SUBTRACT)

    # F12 (on Top) → F13 (join, symmetric)
    with BuildSketch(Plane.XY):
        with Locations((-37, -65.5)):
            Rectangle(F12_W, F12_H)
    extrude(amount=F13_DEPTH, both=True)

    # F14
    f14_edges = [f8.edges().sort_by_distance(p)[0] for p in [
        (-37, -65, -2.25),
        (-37, -65, 2.25),
    ]]
    fillet(f14_edges, radius=F14_R)

    # F15: fillet of radius 3 on 6 edges, made by hand

    # F15_s2 → F15_t1 (cut)
    with BuildSketch(Plane.XY.offset(-9.75)):
        with BuildLine():
            ThreePointArc((-34, -54), (-31.8786796564, -54.8786796564), (-31, -57))
            Line((-31, -57), (-31, -54))
            Line((-31, -54), (-34, -54))
        make_face()
        with BuildLine():
            ThreePointArc((-43, -57), (-42.1213203436, -54.8786796564), (-40, -54))
            Line((-40, -54), (-43, -54))
            Line((-43, -54), (-43, -57))
        make_face()
    extrude(amount=F15_T1_DEPTH, mode=Mode.SUBTRACT)

    # F15_s4 → F15_t3 (cut)
    with BuildSketch(Plane.XZ.offset(57.5)):
        with BuildLine():
            ThreePointArc((-43, 14.5), (-42.1213203436, 16.6213203436), (-40, 17.5))
            Line((-40, 17.5), (-43, 17.5))
            Line((-43, 17.5), (-43, 14.5))
        make_face()
        with BuildLine():
            ThreePointArc((-34, 17.5), (-31.8786796564, 16.6213203436), (-31, 14.5))
            Line((-31, 14.5), (-31, 17.5))
            Line((-31, 17.5), (-34, 17.5))
        make_face()
        with BuildLine():
            ThreePointArc((-43, -14.5), (-42.1213203436, -16.6213203436), (-40, -17.5))
            Line((-40, -17.5), (-43, -17.5))
            Line((-43, -17.5), (-43, -14.5))
        make_face()
        with BuildLine():
            ThreePointArc((-34, -17.5), (-31.8786796564, -16.6213203436), (-31, -14.5))
            Line((-31, -14.5), (-31, -17.5))
            Line((-31, -17.5), (-34, -17.5))
        make_face()
    extrude(amount=F15_T3_DEPTH, mode=Mode.SUBTRACT)


solid = Compound([f1.part, f5.part, f8.part])
